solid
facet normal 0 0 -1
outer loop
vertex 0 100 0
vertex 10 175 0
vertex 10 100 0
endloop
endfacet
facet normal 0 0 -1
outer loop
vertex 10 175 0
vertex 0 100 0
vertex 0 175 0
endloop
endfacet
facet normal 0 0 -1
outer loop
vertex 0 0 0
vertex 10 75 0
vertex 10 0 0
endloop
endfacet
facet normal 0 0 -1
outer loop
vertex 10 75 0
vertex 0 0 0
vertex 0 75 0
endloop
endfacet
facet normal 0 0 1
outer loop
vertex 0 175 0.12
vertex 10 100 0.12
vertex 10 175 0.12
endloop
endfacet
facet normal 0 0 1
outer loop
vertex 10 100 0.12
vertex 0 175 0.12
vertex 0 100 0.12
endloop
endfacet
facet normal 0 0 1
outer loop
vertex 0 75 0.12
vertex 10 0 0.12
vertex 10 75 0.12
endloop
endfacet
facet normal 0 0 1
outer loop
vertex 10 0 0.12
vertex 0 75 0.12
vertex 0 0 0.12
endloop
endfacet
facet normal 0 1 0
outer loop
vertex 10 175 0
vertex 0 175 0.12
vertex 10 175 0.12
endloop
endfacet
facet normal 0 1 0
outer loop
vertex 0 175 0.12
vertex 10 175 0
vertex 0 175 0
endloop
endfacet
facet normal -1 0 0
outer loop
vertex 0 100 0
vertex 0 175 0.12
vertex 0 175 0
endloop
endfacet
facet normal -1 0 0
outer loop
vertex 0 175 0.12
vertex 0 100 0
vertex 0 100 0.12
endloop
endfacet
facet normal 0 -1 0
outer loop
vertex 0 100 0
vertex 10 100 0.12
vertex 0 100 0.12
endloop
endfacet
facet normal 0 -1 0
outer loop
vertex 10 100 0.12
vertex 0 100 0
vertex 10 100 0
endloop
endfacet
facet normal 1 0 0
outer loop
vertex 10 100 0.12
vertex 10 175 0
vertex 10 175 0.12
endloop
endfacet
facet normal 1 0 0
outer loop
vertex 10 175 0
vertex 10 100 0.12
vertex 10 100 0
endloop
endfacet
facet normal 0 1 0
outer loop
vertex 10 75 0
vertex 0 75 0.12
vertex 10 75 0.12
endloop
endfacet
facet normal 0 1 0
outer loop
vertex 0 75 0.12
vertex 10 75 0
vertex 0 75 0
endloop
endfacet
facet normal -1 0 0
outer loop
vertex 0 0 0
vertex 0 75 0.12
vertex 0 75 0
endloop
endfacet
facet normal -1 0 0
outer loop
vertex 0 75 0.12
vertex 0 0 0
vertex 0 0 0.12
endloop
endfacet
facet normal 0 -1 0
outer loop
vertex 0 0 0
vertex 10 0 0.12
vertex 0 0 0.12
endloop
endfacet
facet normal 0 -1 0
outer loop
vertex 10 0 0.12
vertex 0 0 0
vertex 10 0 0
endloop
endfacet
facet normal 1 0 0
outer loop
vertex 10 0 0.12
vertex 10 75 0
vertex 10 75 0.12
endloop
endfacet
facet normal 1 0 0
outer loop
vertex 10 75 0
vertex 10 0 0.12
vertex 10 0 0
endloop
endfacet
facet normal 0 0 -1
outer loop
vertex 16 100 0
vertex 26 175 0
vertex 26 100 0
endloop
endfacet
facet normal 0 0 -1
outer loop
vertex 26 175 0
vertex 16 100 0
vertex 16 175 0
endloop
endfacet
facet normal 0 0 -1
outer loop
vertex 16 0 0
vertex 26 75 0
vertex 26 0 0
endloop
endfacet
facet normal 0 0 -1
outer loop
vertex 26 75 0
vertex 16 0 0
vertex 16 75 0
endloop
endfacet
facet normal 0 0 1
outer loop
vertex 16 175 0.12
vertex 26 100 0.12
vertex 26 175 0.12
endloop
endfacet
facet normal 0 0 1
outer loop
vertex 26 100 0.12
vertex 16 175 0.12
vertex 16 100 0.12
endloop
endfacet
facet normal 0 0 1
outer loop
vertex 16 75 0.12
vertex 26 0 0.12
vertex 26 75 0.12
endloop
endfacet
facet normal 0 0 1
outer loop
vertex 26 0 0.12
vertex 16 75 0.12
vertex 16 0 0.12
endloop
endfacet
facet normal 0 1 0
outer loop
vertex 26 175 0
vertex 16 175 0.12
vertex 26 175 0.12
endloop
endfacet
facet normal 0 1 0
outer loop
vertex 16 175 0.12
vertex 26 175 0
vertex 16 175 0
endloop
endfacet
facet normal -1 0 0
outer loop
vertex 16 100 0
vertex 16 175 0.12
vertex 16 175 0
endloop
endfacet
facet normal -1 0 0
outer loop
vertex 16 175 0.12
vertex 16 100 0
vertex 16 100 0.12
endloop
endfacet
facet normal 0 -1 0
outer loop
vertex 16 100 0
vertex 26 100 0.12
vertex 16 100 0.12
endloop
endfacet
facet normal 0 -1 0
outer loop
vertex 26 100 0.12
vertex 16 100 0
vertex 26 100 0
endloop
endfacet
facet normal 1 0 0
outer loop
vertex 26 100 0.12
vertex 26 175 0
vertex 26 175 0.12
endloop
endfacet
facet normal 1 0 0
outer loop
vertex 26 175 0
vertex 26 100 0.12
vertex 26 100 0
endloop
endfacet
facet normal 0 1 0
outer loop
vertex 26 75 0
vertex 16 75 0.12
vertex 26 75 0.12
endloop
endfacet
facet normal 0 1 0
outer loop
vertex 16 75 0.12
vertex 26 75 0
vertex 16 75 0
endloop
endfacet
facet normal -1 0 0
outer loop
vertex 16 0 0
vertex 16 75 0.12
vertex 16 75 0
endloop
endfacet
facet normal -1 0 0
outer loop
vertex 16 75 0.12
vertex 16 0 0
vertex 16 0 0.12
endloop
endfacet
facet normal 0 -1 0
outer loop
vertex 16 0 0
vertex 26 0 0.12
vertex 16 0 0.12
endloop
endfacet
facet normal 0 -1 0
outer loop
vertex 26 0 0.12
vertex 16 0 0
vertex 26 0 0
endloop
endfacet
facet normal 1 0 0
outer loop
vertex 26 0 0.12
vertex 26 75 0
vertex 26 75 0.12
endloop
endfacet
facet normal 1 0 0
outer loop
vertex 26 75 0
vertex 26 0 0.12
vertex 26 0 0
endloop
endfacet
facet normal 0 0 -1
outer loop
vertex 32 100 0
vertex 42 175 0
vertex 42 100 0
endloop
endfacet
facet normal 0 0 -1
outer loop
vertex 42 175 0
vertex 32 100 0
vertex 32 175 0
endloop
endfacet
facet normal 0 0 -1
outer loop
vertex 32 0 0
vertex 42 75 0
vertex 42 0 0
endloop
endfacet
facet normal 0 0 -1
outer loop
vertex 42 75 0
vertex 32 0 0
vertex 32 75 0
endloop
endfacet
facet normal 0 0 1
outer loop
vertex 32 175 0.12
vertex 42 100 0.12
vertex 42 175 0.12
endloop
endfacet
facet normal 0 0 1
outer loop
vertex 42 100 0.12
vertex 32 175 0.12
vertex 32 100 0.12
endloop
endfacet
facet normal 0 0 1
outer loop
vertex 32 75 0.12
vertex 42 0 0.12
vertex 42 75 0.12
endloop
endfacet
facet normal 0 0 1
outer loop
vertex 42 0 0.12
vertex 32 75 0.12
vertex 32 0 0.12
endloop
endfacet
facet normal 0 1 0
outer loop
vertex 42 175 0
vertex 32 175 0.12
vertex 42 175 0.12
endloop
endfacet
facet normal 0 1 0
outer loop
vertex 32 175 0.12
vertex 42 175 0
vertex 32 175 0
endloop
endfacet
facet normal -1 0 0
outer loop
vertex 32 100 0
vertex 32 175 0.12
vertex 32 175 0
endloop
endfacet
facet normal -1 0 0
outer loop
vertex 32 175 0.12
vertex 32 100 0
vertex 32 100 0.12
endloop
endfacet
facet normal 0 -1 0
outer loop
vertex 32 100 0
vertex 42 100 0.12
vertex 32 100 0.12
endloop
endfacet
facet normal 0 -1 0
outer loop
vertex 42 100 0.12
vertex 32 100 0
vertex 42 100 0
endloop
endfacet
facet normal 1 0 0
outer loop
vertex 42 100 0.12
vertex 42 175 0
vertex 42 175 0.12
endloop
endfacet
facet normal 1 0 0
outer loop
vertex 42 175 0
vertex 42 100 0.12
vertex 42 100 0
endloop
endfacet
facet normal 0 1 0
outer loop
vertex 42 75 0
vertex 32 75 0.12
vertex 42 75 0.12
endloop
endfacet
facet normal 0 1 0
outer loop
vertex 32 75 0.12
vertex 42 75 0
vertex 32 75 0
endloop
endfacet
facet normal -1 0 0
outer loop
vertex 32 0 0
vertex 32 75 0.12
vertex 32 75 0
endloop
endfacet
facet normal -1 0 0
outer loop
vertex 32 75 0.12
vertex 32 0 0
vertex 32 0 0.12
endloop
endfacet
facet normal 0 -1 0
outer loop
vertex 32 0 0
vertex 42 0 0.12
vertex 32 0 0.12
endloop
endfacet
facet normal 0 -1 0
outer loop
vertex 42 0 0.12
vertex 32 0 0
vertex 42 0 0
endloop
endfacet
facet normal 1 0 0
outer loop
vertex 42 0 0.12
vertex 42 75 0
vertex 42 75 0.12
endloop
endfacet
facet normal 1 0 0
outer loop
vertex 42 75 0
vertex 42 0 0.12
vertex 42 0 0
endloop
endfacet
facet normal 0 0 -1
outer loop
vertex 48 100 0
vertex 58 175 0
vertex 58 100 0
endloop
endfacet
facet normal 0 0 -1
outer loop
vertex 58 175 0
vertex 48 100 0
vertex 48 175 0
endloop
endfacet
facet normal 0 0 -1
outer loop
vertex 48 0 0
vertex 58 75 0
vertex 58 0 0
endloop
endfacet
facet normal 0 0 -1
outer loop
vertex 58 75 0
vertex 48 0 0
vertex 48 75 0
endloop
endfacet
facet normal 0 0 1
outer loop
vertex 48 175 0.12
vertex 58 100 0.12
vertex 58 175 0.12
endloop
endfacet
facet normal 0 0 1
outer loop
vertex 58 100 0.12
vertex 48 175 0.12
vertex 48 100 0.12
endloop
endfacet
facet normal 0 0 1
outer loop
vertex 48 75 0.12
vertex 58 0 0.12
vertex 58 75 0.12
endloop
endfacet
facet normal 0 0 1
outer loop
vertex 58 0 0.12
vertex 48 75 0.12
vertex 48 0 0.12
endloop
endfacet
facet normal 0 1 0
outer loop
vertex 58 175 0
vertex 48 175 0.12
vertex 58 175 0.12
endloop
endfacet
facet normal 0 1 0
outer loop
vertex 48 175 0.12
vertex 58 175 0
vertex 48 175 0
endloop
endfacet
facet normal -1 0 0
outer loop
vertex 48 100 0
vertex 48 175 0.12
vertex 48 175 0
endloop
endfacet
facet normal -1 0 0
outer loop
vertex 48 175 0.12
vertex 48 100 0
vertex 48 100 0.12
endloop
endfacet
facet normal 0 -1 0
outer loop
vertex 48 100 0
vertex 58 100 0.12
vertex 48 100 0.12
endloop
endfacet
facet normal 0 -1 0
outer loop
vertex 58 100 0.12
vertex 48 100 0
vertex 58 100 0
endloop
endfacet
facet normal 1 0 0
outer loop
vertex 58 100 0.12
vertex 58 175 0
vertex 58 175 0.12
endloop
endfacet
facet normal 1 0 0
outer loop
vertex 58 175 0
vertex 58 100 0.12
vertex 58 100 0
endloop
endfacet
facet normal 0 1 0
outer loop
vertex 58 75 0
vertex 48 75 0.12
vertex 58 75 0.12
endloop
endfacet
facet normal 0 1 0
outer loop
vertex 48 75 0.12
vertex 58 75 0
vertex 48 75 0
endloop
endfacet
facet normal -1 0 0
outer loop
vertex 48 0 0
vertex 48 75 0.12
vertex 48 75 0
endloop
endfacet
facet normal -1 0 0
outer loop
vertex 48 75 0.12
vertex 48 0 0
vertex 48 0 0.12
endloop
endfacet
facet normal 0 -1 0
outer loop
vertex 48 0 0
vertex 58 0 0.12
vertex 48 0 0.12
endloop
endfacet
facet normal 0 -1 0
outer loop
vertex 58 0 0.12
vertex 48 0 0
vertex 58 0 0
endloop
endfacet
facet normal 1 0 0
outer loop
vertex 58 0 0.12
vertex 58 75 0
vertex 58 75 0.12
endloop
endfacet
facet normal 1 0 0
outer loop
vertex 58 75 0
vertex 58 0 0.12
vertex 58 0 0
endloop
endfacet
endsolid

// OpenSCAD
z=0.12;

for (x = [0:3]) {
    translate([15 * x,0,0]) 
    linear_extrude(z) 
    for (y = [0:1]) {
        translate([x, y * 100, 0]) square([10, 75]);
    }
}
